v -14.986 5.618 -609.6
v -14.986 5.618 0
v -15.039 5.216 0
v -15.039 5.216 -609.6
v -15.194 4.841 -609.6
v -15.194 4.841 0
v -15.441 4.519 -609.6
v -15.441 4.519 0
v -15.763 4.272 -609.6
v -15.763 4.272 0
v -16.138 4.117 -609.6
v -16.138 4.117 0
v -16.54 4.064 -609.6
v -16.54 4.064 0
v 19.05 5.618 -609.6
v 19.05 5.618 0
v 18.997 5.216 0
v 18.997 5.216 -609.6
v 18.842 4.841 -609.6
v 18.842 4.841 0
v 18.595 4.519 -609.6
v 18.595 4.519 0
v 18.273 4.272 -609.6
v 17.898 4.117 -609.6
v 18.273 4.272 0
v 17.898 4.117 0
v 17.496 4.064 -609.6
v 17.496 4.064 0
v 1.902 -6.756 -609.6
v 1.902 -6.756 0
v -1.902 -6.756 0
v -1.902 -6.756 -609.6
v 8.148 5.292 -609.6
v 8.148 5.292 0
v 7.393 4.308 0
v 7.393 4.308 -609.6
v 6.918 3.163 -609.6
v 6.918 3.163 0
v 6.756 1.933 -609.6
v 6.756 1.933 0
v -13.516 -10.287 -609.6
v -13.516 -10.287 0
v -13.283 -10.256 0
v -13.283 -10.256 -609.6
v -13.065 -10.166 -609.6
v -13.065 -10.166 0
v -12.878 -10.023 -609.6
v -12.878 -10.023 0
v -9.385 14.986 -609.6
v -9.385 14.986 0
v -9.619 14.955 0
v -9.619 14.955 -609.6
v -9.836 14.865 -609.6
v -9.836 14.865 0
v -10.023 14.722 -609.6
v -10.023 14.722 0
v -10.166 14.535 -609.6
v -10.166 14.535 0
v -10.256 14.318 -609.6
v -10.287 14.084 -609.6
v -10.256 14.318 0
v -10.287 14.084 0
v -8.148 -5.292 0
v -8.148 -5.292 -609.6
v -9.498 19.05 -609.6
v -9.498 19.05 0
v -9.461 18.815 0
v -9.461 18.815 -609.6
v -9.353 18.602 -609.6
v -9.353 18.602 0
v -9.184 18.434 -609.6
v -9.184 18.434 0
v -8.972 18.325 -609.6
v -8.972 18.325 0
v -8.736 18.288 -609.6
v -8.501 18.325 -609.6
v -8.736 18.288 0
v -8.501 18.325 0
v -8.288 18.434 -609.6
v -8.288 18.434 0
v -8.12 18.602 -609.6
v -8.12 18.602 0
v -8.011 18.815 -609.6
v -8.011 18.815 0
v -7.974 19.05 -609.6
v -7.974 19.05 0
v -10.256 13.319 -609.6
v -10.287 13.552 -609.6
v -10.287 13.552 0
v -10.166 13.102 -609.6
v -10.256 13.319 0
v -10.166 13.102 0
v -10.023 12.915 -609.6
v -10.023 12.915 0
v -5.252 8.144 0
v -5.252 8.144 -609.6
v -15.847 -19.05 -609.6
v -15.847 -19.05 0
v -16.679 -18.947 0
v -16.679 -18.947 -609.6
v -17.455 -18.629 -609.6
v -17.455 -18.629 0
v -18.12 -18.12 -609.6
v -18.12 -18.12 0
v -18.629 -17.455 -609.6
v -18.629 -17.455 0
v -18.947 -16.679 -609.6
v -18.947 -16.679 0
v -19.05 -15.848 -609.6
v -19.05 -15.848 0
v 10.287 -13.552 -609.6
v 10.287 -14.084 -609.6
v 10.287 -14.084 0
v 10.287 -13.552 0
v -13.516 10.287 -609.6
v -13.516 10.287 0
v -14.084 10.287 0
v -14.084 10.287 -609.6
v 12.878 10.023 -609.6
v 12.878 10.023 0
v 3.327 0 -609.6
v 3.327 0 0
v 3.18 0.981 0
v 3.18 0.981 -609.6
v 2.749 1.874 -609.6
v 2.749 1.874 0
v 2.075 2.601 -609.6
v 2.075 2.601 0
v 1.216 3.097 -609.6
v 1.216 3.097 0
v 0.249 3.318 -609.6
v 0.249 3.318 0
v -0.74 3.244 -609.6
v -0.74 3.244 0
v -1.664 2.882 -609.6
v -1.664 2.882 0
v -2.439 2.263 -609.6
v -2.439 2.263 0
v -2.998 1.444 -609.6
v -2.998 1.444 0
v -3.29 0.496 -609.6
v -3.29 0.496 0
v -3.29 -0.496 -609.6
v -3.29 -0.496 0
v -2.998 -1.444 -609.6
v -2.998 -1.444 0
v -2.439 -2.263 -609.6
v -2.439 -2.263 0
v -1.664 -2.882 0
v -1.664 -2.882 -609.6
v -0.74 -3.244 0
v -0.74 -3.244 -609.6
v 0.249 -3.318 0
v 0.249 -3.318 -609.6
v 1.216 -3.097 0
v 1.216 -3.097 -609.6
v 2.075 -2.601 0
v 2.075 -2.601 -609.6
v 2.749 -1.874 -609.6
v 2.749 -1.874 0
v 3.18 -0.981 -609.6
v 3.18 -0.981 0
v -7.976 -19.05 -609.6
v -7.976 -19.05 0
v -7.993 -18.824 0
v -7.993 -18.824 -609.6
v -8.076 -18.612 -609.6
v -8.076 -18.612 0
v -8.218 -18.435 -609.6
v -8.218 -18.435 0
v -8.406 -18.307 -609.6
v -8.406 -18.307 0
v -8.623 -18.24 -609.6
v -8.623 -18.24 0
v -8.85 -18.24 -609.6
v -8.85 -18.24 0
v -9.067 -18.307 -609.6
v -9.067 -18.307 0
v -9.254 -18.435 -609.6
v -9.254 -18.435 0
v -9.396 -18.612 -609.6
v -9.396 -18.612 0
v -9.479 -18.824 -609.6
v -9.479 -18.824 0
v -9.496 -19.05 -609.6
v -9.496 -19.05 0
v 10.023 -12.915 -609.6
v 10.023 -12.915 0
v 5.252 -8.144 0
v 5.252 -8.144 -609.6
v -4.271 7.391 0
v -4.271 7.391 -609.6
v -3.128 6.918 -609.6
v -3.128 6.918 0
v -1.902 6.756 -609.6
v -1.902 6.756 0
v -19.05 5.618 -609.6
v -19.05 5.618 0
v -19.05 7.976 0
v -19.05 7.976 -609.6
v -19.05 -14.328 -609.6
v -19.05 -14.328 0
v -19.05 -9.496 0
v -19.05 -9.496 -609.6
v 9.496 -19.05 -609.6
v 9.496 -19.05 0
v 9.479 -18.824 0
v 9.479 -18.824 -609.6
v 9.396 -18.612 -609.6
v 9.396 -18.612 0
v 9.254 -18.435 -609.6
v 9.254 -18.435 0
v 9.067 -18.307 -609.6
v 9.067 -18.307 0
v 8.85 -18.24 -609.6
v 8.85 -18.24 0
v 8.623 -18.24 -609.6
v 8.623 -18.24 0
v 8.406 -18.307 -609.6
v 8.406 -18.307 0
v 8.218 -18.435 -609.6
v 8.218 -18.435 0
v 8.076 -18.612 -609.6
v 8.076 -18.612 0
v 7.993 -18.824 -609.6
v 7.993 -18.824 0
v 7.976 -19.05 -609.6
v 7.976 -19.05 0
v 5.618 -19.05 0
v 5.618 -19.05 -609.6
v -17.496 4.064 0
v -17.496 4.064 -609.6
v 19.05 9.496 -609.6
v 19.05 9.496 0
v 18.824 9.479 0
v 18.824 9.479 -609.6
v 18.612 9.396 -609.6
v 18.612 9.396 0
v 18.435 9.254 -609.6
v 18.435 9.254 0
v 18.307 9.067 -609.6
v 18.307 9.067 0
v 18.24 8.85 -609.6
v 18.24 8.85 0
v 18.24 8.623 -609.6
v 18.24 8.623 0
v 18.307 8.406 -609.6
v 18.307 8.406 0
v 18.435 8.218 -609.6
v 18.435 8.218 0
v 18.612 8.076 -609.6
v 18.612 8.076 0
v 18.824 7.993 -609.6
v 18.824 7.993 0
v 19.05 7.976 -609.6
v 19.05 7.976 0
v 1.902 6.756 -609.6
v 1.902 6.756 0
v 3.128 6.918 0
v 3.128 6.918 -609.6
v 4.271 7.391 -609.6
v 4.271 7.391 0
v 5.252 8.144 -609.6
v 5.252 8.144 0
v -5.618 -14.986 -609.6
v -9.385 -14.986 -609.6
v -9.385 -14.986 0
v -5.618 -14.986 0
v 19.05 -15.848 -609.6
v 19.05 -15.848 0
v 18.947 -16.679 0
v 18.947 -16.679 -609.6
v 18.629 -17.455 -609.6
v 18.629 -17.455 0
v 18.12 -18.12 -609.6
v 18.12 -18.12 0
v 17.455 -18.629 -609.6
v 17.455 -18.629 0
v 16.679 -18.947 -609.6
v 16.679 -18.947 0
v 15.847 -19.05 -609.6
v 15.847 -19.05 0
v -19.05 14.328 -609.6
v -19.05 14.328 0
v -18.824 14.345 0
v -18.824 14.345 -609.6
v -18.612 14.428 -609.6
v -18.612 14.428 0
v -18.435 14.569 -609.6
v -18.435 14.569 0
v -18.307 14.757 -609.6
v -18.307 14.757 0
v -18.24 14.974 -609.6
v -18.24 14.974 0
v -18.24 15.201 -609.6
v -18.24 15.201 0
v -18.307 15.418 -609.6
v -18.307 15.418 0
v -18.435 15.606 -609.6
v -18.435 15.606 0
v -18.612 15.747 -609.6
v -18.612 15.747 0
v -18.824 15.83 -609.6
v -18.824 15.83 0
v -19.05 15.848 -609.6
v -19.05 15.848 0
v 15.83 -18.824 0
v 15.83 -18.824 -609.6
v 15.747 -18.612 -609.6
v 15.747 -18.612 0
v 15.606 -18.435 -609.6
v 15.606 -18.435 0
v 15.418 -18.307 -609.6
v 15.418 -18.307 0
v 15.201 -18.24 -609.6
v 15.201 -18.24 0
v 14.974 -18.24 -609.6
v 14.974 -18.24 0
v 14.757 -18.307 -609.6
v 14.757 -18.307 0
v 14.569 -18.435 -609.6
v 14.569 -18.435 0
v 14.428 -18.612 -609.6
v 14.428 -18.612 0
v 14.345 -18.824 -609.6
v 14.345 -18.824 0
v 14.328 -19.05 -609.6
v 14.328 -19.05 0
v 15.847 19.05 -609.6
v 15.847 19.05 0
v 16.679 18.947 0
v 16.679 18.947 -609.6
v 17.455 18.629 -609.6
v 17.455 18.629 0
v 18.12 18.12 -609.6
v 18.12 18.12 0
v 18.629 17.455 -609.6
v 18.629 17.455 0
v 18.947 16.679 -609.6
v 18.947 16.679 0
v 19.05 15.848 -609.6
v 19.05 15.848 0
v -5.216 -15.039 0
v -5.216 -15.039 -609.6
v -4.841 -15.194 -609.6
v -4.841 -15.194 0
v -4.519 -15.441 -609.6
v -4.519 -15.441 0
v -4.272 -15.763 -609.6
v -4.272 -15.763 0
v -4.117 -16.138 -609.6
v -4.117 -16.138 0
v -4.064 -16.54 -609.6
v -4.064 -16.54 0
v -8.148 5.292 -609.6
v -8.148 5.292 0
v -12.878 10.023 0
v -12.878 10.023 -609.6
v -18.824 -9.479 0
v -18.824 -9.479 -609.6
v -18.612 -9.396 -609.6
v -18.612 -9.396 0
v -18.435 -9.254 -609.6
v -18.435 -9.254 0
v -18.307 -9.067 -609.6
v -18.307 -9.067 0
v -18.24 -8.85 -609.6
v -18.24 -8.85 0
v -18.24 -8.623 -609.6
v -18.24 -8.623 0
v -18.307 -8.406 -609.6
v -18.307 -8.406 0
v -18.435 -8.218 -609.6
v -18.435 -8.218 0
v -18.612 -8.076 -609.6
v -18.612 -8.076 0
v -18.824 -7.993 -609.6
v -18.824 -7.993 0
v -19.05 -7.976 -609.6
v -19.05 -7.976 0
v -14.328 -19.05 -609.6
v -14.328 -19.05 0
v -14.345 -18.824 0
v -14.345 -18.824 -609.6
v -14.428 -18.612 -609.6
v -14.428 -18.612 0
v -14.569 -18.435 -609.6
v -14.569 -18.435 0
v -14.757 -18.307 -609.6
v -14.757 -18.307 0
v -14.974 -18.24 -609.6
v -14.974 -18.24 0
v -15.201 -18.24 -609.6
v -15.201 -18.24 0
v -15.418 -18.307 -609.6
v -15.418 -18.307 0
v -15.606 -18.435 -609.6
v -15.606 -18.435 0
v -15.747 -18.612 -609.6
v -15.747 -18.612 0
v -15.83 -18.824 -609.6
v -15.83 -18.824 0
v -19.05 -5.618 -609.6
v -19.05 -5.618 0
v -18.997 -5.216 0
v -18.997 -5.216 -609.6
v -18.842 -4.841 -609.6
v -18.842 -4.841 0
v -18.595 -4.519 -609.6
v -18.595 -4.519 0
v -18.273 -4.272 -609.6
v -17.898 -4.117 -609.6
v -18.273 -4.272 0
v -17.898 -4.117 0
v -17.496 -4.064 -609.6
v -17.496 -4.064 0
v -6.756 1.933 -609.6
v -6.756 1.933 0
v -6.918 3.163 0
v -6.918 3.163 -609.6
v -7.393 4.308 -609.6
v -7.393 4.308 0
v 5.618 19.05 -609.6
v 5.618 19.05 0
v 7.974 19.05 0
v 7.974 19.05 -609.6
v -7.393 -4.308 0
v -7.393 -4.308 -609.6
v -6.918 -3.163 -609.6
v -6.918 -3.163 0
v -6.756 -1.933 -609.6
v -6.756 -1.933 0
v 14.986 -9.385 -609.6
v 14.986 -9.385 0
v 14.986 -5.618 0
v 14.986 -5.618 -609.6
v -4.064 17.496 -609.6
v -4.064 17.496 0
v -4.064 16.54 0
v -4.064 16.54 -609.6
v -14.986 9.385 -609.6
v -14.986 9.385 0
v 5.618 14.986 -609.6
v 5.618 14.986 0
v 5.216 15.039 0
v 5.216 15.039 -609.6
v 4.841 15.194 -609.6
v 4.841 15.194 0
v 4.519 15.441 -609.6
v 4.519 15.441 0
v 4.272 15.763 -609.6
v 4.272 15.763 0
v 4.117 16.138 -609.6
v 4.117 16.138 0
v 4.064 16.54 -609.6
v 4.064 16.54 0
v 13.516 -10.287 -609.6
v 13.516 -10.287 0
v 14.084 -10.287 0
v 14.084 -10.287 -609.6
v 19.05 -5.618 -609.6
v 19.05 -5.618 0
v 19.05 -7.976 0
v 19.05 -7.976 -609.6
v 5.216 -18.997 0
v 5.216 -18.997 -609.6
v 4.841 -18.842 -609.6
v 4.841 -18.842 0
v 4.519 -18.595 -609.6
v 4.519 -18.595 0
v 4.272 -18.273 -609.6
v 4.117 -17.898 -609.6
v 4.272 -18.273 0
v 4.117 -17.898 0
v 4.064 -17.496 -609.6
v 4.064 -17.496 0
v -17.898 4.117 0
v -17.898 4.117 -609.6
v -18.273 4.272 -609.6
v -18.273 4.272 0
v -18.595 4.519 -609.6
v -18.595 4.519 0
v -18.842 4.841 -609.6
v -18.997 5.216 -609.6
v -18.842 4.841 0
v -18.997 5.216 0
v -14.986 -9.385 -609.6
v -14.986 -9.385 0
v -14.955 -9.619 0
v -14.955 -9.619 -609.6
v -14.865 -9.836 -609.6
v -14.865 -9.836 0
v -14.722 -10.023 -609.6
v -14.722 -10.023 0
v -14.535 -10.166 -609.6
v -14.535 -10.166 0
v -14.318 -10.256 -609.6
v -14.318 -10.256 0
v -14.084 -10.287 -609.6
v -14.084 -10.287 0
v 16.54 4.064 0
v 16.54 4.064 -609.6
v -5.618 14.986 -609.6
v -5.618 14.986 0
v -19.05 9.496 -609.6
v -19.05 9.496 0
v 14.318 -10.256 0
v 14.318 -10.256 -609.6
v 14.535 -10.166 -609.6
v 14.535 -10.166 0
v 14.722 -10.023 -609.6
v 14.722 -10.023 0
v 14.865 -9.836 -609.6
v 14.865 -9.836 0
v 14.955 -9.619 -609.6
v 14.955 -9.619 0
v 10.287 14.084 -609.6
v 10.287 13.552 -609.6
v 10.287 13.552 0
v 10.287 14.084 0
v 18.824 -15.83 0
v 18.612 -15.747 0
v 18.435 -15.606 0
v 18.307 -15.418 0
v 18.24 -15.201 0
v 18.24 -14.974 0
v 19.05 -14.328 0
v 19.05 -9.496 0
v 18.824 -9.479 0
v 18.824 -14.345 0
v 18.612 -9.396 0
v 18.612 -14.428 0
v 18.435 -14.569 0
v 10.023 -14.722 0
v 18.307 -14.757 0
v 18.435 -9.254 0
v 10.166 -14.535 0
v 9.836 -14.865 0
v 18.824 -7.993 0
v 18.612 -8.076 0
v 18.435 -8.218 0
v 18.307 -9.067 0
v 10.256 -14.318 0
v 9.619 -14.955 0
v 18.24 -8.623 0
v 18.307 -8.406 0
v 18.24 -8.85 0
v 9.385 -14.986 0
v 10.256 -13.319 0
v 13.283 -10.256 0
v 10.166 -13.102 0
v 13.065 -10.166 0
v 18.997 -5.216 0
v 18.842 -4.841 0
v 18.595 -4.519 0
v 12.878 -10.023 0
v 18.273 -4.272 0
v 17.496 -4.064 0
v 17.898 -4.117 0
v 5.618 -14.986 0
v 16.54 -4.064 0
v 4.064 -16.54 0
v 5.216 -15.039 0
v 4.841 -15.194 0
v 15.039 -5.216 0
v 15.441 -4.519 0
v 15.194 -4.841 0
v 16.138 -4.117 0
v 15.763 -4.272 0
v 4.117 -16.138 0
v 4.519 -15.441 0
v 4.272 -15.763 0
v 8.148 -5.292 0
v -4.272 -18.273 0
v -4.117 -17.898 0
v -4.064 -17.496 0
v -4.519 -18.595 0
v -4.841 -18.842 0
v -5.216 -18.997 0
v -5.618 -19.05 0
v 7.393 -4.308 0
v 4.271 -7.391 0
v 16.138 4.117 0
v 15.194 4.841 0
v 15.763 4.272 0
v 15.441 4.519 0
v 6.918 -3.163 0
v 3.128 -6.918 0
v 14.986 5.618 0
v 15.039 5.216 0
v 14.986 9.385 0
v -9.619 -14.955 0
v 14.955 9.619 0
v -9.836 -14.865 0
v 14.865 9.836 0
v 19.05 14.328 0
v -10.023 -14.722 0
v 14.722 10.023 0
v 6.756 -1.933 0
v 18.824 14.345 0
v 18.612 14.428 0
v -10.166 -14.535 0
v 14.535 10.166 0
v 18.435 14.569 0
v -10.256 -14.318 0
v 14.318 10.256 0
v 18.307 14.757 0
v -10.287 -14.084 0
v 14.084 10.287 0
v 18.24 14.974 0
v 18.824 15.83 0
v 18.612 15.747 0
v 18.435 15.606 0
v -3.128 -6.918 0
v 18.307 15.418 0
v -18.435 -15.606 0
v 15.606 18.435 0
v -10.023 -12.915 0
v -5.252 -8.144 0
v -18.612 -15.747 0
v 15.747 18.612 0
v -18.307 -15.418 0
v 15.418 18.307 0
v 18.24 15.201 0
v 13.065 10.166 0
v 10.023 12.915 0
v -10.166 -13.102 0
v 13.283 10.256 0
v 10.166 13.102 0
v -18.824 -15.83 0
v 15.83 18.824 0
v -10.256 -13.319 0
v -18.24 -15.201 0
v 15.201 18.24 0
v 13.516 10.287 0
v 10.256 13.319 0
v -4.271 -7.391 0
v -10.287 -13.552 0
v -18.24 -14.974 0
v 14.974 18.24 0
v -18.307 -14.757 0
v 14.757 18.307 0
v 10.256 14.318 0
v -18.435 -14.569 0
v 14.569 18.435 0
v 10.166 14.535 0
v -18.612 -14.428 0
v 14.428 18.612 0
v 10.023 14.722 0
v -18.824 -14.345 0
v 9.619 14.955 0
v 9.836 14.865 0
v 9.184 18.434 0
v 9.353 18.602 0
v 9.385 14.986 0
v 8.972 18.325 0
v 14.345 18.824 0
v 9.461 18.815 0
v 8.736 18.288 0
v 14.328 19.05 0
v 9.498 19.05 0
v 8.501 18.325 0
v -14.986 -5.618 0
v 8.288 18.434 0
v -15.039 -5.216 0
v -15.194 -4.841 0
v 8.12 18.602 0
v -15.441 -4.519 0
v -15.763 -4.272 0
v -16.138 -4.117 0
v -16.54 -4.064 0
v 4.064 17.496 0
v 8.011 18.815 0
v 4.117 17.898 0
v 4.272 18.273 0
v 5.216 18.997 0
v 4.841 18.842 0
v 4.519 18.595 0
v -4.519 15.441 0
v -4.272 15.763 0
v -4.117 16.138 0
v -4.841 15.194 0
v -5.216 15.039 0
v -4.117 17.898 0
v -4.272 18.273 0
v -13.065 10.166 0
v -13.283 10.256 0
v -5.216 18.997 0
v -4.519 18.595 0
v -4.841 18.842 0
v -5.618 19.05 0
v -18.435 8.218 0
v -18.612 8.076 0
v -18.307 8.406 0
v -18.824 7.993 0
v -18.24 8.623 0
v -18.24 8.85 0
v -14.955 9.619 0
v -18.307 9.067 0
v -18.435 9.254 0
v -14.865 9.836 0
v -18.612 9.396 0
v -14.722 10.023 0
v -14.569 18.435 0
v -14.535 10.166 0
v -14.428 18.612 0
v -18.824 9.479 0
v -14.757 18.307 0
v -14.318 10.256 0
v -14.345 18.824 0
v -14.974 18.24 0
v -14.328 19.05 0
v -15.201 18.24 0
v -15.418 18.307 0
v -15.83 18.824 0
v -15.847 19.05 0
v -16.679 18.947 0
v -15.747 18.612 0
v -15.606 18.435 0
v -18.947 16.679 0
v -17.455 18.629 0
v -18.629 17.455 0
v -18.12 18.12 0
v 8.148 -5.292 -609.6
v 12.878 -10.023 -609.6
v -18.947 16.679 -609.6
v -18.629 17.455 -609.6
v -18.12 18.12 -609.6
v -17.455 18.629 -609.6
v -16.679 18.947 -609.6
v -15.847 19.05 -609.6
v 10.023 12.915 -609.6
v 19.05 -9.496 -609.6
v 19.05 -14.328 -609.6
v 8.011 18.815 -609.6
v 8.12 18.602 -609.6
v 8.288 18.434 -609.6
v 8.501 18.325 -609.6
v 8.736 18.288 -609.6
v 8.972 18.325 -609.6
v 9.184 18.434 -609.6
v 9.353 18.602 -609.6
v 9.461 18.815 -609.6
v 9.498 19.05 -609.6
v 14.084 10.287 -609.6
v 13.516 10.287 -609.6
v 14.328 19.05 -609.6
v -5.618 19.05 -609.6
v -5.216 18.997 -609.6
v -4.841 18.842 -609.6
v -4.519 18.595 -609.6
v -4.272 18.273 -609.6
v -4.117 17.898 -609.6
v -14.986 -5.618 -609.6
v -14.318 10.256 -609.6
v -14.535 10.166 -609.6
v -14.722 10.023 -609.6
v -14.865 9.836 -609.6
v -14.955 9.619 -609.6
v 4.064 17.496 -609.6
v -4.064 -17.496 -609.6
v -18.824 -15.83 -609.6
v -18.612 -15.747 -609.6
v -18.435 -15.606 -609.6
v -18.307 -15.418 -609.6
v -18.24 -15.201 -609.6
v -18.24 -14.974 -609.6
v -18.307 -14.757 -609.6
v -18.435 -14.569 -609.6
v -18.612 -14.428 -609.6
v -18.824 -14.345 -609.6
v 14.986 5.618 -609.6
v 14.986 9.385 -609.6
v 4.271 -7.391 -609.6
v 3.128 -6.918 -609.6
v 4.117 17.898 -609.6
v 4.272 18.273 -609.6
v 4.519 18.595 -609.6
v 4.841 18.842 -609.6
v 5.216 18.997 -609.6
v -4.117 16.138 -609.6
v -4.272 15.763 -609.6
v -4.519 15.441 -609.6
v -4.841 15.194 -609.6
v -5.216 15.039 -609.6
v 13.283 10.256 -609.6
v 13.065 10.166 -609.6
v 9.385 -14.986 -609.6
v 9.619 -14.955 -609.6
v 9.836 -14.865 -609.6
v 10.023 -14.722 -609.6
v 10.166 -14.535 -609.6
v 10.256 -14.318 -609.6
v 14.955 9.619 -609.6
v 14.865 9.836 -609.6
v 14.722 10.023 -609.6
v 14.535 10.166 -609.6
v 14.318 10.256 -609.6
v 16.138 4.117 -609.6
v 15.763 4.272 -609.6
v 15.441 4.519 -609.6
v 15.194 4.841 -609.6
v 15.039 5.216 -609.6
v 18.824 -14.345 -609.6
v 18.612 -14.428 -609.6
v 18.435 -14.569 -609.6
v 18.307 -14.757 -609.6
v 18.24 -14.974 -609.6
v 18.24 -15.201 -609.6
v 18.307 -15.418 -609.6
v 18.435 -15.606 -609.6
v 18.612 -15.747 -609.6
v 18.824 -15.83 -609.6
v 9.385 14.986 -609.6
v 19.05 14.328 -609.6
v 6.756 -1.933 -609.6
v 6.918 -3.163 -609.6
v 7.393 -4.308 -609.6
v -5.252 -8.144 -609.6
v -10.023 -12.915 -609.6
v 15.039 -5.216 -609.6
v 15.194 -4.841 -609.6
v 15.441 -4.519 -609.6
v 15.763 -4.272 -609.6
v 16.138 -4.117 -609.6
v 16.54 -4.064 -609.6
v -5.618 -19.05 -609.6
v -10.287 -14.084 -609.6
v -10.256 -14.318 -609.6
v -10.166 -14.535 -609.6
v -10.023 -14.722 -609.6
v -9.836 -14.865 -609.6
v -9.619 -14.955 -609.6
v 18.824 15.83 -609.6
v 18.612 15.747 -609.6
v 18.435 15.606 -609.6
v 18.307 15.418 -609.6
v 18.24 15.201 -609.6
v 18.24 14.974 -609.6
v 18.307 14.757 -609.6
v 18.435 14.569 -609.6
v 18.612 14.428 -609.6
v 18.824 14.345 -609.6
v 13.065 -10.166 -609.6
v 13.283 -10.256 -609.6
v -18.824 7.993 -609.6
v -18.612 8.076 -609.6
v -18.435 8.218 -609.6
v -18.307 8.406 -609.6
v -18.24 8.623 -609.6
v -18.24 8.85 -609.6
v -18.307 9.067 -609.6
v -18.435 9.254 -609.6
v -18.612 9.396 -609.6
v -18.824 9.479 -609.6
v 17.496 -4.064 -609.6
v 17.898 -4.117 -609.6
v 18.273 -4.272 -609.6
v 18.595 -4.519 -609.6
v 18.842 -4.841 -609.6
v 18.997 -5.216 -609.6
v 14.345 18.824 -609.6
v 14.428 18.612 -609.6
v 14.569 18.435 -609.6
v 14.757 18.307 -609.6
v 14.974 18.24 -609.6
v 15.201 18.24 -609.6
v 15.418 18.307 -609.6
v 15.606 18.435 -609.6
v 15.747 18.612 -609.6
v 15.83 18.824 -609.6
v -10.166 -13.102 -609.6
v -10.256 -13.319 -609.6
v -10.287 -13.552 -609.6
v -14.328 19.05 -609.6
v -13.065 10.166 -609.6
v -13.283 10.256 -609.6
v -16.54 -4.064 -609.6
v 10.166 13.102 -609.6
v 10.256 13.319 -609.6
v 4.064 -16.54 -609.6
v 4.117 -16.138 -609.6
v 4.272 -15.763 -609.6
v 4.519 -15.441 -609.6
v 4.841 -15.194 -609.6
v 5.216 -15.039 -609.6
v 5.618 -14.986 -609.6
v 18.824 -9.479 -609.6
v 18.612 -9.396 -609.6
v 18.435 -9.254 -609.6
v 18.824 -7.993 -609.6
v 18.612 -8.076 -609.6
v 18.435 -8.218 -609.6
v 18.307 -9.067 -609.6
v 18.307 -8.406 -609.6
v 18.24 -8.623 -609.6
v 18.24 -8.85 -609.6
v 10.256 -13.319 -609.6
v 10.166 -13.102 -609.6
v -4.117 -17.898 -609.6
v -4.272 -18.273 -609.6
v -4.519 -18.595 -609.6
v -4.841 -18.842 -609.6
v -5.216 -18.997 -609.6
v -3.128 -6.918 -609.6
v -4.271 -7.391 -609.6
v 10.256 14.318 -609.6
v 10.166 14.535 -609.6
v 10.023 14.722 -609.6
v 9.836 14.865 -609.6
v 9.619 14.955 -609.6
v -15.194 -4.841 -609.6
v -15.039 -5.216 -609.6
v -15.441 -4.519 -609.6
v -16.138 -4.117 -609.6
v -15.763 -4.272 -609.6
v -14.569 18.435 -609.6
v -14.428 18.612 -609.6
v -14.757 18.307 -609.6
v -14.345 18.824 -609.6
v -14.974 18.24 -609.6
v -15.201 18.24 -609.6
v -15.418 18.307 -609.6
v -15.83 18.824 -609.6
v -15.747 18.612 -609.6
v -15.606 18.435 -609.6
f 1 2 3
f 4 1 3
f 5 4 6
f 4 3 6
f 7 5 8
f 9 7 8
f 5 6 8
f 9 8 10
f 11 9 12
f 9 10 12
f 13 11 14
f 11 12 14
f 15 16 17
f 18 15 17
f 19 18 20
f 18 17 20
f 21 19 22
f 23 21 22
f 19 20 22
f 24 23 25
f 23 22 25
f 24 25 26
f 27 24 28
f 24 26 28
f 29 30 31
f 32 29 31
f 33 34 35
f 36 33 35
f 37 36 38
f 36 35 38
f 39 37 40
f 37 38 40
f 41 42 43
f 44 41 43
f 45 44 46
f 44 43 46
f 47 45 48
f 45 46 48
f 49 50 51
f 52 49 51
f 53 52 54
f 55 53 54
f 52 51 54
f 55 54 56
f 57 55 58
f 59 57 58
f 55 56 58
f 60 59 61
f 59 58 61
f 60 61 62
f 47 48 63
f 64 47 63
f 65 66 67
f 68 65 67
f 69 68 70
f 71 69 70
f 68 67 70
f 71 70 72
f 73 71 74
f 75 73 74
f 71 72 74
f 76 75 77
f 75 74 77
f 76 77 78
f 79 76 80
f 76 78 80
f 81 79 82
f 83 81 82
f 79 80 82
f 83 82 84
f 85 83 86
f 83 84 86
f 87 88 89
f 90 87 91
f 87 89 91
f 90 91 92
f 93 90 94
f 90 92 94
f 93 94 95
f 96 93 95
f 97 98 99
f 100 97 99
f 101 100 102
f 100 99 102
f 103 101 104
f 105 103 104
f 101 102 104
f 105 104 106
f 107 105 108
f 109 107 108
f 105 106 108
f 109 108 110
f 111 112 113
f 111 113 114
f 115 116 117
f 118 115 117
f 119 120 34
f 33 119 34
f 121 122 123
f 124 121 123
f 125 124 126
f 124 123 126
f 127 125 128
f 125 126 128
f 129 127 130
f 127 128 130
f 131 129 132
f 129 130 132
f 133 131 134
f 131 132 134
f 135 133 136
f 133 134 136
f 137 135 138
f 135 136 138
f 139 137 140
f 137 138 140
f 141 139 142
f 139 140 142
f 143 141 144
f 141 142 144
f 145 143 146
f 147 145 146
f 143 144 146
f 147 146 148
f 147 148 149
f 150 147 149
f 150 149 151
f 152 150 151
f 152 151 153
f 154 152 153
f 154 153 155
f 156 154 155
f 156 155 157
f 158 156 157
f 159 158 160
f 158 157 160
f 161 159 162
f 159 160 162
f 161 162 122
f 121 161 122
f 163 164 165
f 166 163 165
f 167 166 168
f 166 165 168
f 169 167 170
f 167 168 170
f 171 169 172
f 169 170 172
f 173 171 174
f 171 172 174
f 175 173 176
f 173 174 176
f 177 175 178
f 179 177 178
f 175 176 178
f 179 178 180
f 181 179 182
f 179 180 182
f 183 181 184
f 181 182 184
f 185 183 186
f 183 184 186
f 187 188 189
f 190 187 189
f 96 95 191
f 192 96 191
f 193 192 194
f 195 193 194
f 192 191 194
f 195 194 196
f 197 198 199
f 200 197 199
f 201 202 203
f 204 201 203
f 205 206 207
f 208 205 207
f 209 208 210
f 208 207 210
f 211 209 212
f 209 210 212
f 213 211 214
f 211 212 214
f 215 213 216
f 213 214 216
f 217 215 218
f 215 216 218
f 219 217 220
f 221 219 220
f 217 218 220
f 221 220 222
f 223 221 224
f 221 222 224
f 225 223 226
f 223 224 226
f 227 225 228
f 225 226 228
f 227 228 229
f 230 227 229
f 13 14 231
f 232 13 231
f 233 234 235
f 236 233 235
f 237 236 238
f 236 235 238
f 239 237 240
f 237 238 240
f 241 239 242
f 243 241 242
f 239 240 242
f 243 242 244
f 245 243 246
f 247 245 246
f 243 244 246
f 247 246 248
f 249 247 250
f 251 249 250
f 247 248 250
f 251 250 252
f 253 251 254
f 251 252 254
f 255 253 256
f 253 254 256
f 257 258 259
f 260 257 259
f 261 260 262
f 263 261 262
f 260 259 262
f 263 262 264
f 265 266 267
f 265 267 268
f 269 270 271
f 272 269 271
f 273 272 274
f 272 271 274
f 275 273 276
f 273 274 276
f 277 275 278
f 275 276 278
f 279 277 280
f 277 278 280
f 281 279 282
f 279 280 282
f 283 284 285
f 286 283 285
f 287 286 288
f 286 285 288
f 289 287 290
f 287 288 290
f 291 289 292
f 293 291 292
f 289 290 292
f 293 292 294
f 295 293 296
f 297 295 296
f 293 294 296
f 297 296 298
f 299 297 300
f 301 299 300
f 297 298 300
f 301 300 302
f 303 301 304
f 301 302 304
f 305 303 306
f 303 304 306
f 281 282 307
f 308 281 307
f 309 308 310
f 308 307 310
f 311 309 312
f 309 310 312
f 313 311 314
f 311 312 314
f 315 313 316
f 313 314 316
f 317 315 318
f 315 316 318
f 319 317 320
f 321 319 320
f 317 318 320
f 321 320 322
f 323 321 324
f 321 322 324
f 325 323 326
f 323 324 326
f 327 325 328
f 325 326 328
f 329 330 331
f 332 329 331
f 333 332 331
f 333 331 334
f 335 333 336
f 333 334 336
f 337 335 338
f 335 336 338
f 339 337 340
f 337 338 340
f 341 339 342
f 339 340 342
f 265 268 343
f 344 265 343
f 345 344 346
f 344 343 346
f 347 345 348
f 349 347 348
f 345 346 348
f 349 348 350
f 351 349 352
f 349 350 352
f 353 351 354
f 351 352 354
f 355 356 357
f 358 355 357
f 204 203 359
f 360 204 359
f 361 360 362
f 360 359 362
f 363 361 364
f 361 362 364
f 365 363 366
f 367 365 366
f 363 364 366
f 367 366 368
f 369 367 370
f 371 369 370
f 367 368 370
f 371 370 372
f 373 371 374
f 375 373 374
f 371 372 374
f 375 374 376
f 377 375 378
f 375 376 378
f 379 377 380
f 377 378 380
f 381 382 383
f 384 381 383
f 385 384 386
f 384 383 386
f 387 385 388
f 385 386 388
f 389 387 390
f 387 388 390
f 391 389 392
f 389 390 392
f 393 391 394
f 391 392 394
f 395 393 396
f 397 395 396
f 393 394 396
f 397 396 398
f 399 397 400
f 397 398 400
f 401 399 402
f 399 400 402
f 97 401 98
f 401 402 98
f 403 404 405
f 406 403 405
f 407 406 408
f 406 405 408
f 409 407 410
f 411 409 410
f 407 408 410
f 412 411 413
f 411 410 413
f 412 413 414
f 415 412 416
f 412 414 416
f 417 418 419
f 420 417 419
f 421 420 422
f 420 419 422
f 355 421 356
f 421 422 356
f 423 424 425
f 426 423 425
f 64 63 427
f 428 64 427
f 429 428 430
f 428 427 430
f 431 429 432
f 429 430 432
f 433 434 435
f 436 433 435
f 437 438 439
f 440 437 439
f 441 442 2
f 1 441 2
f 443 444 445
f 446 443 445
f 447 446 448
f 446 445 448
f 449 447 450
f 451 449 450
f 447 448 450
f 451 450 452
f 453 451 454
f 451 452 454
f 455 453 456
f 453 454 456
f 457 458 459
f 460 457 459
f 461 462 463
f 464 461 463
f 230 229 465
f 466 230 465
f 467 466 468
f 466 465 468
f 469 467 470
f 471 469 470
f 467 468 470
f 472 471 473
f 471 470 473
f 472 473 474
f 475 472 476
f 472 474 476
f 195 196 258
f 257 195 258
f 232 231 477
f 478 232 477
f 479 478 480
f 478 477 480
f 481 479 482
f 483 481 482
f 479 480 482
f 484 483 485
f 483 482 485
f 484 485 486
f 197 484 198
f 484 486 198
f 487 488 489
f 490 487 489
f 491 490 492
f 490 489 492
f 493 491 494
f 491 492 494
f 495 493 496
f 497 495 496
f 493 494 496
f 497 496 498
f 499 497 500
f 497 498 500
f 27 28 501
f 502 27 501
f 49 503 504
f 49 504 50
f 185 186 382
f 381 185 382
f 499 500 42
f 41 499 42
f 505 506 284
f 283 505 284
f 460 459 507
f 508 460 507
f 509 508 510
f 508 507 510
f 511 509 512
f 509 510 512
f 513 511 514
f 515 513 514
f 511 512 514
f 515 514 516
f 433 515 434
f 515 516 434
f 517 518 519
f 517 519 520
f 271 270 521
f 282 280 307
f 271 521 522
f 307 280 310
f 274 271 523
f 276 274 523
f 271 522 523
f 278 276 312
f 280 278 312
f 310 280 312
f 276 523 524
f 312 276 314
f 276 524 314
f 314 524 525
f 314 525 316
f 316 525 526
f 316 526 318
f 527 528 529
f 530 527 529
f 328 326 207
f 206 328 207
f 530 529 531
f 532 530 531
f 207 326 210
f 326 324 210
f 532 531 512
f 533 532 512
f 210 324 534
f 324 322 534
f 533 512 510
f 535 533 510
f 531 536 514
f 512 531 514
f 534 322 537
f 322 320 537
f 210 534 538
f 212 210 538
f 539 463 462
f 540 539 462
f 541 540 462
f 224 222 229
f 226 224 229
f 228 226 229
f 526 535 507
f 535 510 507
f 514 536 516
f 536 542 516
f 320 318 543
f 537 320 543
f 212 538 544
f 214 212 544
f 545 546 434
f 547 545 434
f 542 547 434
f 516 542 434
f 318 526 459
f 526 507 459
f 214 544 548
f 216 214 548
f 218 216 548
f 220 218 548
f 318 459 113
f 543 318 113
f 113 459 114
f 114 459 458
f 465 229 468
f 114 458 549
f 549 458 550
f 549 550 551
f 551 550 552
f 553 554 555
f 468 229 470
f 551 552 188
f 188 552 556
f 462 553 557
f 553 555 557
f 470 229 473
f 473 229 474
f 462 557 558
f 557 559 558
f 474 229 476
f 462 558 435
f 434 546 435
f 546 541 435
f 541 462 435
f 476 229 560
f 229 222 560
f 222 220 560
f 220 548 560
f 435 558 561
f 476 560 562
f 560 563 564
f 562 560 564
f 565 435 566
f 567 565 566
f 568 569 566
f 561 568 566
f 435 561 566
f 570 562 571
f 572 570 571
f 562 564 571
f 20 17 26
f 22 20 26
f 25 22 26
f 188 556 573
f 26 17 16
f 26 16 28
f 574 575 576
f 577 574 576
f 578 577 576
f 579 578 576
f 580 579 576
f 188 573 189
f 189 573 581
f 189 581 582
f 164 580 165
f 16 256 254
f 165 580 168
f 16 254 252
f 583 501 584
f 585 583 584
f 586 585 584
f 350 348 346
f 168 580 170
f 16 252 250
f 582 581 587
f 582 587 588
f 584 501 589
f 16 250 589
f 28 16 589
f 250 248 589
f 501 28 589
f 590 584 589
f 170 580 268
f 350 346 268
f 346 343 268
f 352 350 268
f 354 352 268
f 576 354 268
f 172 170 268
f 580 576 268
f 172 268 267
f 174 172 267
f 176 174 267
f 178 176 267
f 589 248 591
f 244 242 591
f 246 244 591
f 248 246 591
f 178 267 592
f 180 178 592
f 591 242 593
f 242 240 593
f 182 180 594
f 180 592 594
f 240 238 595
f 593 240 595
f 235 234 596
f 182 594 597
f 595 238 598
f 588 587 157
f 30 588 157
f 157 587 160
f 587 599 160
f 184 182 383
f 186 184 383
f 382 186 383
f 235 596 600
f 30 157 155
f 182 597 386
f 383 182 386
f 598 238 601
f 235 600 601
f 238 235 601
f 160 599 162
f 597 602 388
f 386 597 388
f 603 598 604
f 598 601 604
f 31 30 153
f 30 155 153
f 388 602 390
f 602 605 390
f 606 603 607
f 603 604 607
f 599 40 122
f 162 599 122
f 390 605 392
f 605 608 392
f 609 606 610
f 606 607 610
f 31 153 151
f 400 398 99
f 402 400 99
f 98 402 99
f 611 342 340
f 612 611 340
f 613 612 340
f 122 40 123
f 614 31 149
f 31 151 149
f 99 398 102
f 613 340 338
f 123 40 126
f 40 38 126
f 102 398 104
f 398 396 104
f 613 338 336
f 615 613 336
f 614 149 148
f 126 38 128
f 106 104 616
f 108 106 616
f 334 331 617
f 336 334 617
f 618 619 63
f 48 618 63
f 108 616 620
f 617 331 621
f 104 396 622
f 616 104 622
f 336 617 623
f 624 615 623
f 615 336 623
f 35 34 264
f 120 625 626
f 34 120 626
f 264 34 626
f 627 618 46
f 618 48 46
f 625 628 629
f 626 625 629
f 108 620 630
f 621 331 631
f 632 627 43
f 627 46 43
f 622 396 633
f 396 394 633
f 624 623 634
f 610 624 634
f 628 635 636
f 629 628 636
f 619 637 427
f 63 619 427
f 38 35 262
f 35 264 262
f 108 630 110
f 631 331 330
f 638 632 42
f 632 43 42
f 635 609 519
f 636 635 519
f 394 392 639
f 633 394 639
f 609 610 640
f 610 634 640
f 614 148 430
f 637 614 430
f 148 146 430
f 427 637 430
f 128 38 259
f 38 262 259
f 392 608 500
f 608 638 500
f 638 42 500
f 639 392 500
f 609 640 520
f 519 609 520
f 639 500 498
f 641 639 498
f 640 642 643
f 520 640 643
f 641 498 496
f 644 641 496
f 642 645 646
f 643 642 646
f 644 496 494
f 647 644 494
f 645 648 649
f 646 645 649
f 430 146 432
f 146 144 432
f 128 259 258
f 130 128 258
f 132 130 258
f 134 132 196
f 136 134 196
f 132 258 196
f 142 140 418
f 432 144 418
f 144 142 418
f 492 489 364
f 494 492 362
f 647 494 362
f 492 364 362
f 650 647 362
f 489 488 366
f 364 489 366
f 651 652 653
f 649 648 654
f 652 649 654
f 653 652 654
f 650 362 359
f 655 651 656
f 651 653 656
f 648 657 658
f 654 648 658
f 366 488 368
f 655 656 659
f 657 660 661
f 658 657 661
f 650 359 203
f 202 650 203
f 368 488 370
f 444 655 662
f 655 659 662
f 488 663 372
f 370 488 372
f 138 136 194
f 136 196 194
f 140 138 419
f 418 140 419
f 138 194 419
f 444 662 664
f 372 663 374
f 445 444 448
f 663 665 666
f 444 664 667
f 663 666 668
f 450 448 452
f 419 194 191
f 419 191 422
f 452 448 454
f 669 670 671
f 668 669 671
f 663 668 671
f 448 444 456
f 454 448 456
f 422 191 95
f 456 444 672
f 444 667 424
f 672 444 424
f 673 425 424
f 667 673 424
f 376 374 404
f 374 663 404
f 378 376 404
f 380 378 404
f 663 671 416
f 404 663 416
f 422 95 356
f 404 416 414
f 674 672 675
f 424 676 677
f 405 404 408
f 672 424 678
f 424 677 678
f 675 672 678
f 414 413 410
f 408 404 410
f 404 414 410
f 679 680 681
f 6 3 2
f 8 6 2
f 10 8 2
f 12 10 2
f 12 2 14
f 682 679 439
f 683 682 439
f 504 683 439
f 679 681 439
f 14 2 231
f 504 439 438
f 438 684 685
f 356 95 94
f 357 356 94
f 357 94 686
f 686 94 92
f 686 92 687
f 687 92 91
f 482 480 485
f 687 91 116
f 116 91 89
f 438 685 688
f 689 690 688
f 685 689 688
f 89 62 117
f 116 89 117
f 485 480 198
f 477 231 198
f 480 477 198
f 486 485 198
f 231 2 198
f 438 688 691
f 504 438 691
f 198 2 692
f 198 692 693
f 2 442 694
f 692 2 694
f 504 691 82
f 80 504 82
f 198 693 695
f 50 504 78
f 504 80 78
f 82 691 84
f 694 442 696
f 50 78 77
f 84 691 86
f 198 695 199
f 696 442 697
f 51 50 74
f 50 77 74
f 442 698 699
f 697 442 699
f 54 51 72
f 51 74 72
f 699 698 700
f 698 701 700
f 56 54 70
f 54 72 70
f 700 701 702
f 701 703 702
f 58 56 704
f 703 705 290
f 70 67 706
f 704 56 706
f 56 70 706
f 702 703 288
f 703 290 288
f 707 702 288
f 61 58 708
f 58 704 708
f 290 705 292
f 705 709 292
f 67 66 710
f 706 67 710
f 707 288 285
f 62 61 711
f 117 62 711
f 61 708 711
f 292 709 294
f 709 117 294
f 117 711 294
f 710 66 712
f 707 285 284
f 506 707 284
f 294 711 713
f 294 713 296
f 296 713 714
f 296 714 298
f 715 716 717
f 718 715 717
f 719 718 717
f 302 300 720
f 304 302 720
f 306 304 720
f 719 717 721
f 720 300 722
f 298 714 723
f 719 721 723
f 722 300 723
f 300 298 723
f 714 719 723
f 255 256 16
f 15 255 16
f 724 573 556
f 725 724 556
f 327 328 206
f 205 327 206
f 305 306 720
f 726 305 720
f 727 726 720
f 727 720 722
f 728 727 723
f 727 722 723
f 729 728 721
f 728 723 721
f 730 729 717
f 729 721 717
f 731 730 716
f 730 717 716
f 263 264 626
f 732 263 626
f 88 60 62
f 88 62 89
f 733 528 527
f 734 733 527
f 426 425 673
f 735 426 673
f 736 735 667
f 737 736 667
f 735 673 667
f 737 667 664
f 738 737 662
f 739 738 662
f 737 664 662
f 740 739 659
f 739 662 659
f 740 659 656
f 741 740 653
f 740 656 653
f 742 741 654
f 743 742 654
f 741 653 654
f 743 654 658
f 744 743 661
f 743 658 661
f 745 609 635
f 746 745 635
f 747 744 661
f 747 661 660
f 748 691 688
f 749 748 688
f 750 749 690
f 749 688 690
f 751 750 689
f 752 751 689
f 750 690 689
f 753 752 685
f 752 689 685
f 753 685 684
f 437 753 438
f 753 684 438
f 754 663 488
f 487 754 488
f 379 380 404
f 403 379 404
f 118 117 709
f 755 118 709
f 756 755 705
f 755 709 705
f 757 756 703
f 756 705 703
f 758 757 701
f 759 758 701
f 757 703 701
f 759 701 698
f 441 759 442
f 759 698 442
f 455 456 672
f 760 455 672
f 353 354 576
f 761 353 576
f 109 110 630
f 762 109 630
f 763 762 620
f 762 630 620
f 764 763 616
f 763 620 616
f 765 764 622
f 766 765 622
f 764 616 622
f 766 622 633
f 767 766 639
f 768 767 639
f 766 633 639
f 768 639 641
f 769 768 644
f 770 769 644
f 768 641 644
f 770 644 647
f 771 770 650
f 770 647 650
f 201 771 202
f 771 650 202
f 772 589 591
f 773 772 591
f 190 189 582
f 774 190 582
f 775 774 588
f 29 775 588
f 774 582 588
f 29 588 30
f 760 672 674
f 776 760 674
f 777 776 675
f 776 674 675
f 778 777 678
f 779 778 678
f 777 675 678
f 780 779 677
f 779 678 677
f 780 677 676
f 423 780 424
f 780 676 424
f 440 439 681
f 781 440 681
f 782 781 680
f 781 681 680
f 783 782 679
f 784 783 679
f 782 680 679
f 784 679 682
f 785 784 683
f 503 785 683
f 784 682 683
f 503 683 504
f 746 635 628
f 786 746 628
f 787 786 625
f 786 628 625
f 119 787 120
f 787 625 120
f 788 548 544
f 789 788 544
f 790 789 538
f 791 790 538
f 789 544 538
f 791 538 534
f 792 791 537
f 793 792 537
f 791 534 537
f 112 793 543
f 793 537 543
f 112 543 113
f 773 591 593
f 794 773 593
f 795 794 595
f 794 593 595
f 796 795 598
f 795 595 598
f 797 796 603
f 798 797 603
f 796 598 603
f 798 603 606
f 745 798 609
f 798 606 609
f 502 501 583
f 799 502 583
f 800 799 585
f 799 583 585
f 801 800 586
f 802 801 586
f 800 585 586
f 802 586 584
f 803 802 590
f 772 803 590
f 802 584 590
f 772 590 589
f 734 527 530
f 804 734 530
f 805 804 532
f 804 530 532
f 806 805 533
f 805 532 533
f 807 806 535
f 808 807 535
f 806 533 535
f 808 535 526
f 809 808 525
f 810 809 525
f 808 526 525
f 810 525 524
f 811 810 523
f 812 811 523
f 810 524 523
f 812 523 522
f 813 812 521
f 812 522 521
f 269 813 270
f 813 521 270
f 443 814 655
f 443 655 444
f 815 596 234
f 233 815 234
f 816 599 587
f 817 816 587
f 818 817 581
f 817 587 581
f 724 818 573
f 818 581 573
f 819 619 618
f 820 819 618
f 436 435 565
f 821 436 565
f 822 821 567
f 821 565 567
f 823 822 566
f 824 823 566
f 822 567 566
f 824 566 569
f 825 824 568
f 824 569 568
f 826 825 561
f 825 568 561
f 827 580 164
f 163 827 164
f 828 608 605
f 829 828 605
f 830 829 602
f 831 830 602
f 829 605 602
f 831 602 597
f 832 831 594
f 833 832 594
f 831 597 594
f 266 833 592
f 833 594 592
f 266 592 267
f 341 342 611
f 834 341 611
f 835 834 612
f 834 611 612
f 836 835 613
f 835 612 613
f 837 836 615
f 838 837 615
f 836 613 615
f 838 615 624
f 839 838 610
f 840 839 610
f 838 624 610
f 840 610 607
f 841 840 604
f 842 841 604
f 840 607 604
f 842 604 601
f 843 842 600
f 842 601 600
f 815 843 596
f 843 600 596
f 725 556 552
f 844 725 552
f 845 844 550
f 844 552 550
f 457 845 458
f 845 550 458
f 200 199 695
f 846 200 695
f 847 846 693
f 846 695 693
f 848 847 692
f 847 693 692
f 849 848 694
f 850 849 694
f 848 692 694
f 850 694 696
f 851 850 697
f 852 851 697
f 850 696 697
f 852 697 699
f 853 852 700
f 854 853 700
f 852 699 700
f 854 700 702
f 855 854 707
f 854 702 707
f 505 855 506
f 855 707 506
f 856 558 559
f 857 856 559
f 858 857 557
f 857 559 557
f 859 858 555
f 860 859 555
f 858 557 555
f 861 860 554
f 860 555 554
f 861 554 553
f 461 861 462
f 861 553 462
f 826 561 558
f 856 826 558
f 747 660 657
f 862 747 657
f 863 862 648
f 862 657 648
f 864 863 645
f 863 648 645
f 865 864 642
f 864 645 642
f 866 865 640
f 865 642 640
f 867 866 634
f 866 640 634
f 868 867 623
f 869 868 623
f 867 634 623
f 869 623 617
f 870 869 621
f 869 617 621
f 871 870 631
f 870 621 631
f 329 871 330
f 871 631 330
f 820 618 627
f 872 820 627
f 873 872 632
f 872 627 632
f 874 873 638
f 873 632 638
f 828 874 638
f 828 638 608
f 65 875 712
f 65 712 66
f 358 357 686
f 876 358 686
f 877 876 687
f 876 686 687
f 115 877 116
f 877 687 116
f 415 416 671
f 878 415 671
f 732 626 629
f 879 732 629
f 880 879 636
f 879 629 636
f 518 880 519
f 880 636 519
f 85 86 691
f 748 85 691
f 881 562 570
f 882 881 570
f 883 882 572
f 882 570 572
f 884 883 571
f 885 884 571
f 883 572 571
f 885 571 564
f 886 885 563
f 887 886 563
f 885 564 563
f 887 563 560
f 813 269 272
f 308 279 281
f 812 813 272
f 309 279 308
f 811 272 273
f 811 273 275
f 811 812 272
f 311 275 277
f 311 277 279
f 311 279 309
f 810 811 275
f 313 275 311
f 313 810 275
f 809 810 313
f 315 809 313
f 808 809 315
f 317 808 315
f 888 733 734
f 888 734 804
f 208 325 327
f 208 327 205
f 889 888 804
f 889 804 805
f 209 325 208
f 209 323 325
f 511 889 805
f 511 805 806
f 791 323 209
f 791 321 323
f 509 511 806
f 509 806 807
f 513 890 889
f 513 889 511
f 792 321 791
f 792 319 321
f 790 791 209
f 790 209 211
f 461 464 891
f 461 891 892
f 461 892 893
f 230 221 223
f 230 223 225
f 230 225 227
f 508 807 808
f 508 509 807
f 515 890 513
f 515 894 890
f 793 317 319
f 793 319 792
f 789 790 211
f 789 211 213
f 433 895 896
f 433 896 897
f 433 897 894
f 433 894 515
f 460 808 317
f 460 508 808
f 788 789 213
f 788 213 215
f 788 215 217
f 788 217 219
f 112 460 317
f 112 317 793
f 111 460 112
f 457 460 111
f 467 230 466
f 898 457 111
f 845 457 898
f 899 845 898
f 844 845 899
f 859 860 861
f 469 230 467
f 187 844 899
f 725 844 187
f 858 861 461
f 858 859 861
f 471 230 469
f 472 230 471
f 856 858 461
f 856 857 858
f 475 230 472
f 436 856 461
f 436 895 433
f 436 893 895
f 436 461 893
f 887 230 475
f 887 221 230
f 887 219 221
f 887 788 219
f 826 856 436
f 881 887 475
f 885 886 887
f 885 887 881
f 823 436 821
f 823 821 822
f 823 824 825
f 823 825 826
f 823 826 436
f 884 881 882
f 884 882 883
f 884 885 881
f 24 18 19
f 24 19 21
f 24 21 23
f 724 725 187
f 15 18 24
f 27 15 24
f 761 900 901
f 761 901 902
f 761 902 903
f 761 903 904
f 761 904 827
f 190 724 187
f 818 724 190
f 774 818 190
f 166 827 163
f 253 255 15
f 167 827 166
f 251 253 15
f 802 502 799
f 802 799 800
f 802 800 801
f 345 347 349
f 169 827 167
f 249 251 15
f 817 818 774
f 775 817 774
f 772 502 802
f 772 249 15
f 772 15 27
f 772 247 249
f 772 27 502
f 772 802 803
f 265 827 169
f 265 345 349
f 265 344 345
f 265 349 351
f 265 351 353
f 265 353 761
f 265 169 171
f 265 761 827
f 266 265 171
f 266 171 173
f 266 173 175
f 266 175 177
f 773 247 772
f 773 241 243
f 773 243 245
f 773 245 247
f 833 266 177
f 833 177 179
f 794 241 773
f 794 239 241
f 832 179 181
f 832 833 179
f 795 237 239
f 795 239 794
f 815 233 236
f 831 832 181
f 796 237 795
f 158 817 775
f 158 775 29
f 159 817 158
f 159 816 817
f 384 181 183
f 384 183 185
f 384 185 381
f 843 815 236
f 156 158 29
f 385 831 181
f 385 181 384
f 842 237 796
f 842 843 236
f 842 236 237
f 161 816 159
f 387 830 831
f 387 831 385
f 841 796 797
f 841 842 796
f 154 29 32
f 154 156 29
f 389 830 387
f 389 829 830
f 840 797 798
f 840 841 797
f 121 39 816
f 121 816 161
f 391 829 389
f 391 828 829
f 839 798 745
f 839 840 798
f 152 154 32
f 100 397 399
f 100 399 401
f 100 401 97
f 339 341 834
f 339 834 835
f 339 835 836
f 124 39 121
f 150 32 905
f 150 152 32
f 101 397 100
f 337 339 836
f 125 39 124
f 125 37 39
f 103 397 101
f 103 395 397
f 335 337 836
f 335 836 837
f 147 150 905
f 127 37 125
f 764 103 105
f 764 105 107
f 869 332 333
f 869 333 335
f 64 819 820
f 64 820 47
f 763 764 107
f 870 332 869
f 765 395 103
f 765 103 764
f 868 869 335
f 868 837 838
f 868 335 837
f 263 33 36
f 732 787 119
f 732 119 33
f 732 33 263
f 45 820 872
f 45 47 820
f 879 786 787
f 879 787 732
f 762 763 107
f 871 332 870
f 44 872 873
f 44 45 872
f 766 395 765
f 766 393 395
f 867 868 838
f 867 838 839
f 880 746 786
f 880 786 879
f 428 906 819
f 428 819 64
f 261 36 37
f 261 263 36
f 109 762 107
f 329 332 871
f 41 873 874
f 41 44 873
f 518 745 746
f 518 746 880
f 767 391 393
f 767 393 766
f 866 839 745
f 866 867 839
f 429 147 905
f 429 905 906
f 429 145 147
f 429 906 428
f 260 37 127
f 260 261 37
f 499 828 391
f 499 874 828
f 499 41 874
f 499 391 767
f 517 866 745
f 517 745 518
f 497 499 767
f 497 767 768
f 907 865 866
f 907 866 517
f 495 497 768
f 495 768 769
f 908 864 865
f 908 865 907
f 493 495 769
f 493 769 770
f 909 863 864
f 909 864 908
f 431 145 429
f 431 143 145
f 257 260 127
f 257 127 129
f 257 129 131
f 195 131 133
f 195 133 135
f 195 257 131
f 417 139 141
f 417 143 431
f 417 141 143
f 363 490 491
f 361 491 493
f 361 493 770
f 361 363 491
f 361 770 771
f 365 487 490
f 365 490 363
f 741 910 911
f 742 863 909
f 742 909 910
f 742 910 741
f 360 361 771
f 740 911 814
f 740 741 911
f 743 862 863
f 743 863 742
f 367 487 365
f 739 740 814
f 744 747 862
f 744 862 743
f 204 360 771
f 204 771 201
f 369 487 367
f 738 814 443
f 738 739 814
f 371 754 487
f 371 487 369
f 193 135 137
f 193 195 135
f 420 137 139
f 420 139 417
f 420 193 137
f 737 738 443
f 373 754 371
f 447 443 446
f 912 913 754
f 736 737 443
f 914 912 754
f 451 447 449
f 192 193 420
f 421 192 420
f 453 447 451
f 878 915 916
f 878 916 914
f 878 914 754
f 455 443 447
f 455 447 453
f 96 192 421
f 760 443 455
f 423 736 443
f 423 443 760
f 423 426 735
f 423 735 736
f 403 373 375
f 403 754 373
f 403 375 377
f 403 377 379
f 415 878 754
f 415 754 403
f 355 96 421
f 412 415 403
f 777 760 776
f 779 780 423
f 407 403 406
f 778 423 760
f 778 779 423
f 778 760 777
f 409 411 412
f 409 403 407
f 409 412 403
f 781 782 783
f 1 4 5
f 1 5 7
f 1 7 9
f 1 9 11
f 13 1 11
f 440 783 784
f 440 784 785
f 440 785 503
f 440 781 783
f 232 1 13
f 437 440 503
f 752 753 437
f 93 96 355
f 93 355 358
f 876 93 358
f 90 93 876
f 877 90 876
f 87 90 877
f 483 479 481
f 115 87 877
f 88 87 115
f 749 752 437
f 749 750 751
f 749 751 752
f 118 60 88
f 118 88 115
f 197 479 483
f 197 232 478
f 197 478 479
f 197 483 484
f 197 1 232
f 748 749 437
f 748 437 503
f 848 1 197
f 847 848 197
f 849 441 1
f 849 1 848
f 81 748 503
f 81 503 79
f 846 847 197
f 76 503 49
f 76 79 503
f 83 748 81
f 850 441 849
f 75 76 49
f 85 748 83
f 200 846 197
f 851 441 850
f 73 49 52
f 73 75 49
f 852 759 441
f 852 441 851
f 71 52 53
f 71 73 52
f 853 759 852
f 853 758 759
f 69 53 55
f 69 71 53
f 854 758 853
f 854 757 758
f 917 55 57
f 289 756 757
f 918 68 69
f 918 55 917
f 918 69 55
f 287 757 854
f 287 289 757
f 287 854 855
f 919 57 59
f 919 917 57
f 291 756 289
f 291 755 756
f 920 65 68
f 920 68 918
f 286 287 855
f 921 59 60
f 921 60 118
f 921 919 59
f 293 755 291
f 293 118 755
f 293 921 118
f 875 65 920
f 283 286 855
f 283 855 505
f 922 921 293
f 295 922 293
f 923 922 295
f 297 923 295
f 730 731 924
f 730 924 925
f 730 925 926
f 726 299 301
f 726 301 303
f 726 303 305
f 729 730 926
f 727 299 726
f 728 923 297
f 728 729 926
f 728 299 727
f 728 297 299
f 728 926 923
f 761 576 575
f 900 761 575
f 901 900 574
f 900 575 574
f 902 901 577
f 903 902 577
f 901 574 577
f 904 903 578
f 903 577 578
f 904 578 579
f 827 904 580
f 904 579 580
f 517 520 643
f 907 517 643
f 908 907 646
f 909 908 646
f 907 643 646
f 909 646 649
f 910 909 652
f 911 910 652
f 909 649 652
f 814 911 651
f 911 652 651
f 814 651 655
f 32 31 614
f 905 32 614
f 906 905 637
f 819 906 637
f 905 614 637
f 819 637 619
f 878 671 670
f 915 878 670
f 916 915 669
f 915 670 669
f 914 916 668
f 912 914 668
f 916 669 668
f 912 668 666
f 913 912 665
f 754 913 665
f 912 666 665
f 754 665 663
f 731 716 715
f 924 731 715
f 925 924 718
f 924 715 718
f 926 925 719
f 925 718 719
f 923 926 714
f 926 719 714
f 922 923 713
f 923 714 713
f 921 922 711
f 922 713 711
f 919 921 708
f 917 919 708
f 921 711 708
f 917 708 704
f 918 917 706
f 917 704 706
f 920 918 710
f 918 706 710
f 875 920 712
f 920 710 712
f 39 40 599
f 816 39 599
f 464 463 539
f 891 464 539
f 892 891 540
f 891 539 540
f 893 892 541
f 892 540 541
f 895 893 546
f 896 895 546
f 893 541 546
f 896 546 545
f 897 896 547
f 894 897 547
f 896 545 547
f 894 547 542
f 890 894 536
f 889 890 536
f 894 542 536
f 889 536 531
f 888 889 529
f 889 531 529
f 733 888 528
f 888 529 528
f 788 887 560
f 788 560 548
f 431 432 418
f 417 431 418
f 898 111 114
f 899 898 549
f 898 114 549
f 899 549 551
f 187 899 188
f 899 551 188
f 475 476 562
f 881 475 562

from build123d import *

# Parameters (mm, degrees)
SKETCH1_R      = 3.3274
EXTRUDE1_DEPTH = 609.6


with BuildPart() as part:
    # Sketch1 → Extrude1 (new body)
    with BuildSketch(Plane.XY):
        with BuildLine():
            Line((-10.022898969, 12.91475973), (-5.252158105, 8.144007132))
            ThreePointArc((-5.252158105, 8.144007132), (-3.715177372, 7.117027388), (-1.902183975, 6.7564))
            Line((-1.902183975, 6.7564), (1.902183975, 6.7564))
            ThreePointArc((1.902183975, 6.7564), (3.715177372, 7.117027388), (5.252158105, 8.144007132))
            Line((5.252158105, 8.144007132), (10.022898969, 12.91475973))
            ThreePointArc((10.022898969, 12.91475973), (10.218362387, 13.207291992), (10.287, 13.552357131))
            Line((10.287, 13.552357131), (10.287, 14.0843))
            ThreePointArc((10.287, 14.0843), (10.022898185, 14.721898185), (9.3853, 14.986))
            Line((9.3853, 14.986), (5.617617549, 14.986))
            ThreePointArc((5.617617549, 14.986), (4.519044045, 15.441044045), (4.064, 16.539617549))
            Line((4.064, 16.539617549), (4.064, 17.496382451))
            ThreePointArc((4.064, 17.496382451), (4.519044045, 18.594955955), (5.617617549, 19.05))
            Line((5.617617549, 19.05), (7.974178704, 19.05))
            ThreePointArc((7.974178704, 19.05), (8.736178704, 18.288), (9.498178704, 19.05))
            Line((9.498178704, 19.05), (14.327719207, 19.05))
            ThreePointArc((14.327719207, 19.05), (15.087603123, 18.231251131), (15.847487039, 19.05))
            ThreePointArc((15.847487039, 19.05), (18.120176289, 18.120192083), (19.05, 15.847509295))
            ThreePointArc((19.05, 15.847509295), (18.231250992, 15.08762539), (19.05, 14.327741484))
            Line((19.05, 14.327741484), (19.05, 9.496091471))
            ThreePointArc((19.05, 9.496091471), (18.231250992, 8.736207565), (19.05, 7.97632366))
            Line((19.05, 7.97632366), (19.05, 5.617617549))
            ThreePointArc((19.05, 5.617617549), (18.594955955, 4.519044045), (17.496382451, 4.064))
            Line((17.496382451, 4.064), (16.539617549, 4.064))
            ThreePointArc((16.539617549, 4.064), (15.441044045, 4.519044045), (14.986, 5.617617549))
            Line((14.986, 5.617617549), (14.986, 9.385342516))
            ThreePointArc((14.986, 9.385342516), (14.721898185, 10.022940701), (14.0843, 10.287042516))
            Line((14.0843, 10.287042516), (13.516042086, 10.287042516))
            ThreePointArc((13.516042086, 10.287042516), (13.170975923, 10.218404478), (12.878443117, 10.022939917))
            Line((12.878443117, 10.022939917), (8.14758008, 5.292065243))
            ThreePointArc((8.14758008, 5.292065243), (7.117955879, 3.751120653), (6.7564, 1.933453584))
            Line((6.7564, 1.933453584), (6.7564, -1.933453584))
            ThreePointArc((6.7564, -1.933453584), (7.117955879, -3.751120653), (8.14758008, -5.292065243))
            Line((8.14758008, -5.292065243), (12.878443117, -10.022939917))
            ThreePointArc((12.878443117, -10.022939917), (13.170975923, -10.218404478), (13.516042086, -10.287042516))
            Line((13.516042086, -10.287042516), (14.0843, -10.287042516))
            ThreePointArc((14.0843, -10.287042516), (14.721898185, -10.022940701), (14.986, -9.385342516))
            Line((14.986, -9.385342516), (14.986, -5.617617549))
            ThreePointArc((14.986, -5.617617549), (15.441044045, -4.519044045), (16.539617549, -4.064))
            Line((16.539617549, -4.064), (17.496382451, -4.064))
            ThreePointArc((17.496382451, -4.064), (18.594955955, -4.519044045), (19.05, -5.617617549))
            Line((19.05, -5.617617549), (19.05, -7.976318491))
            ThreePointArc((19.05, -7.976318491), (18.231250992, -8.736202396), (19.05, -9.496086302))
            Line((19.05, -9.496086302), (19.05, -14.32774291))
            ThreePointArc((19.05, -14.32774291), (18.231250992, -15.087626816), (19.05, -15.847510721))
            ThreePointArc((19.05, -15.847510721), (18.120175716, -18.120192644), (15.847486868, -19.05))
            ThreePointArc((15.847486868, -19.05), (15.087602952, -18.231251131), (14.327719036, -19.05))
            Line((14.327719036, -19.05), (9.496062448, -19.05))
            ThreePointArc((9.496062448, -19.05), (8.736178532, -18.231251131), (7.976294616, -19.05))
            Line((7.976294616, -19.05), (5.617617549, -19.05))
            ThreePointArc((5.617617549, -19.05), (4.519044045, -18.594955955), (4.064, -17.496382451))
            Line((4.064, -17.496382451), (4.064, -16.539617549))
            ThreePointArc((4.064, -16.539617549), (4.519044045, -15.441044045), (5.617617549, -14.986))
            Line((5.617617549, -14.986), (9.3853, -14.986))
            ThreePointArc((9.3853, -14.986), (10.022898185, -14.721898185), (10.287, -14.0843))
            Line((10.287, -14.0843), (10.287, -13.552357131))
            ThreePointArc((10.287, -13.552357131), (10.218362387, -13.207291992), (10.022898969, -12.91475973))
            Line((10.022898969, -12.91475973), (5.252158105, -8.144007132))
            ThreePointArc((5.252158105, -8.144007132), (3.715177372, -7.117027388), (1.902183975, -6.7564))
            Line((1.902183975, -6.7564), (-1.902183975, -6.7564))
            ThreePointArc((-1.902183975, -6.7564), (-3.715177372, -7.117027388), (-5.252158105, -8.144007132))
            Line((-5.252158105, -8.144007132), (-10.022898969, -12.91475973))
            ThreePointArc((-10.022898969, -12.91475973), (-10.218362387, -13.207291992), (-10.287, -13.552357131))
            Line((-10.287, -13.552357131), (-10.287, -14.0843))
            ThreePointArc((-10.287, -14.0843), (-10.022898185, -14.721898185), (-9.3853, -14.986))
            Line((-9.3853, -14.986), (-5.617617549, -14.986))
            ThreePointArc((-5.617617549, -14.986), (-4.519044045, -15.441044045), (-4.064, -16.539617549))
            Line((-4.064, -16.539617549), (-4.064, -17.496382451))
            ThreePointArc((-4.064, -17.496382451), (-4.519044045, -18.594955955), (-5.617617549, -19.05))
            Line((-5.617617549, -19.05), (-7.976294616, -19.05))
            ThreePointArc((-7.976294616, -19.05), (-8.736178532, -18.231251131), (-9.496062448, -19.05))
            Line((-9.496062448, -19.05), (-14.327719036, -19.05))
            ThreePointArc((-14.327719036, -19.05), (-15.087602952, -18.231251131), (-15.847486868, -19.05))
            ThreePointArc((-15.847486868, -19.05), (-18.120175716, -18.120192644), (-19.05, -15.847510721))
            ThreePointArc((-19.05, -15.847510721), (-18.231250992, -15.087626816), (-19.05, -14.32774291))
            Line((-19.05, -14.32774291), (-19.05, -9.496086302))
            ThreePointArc((-19.05, -9.496086302), (-18.231250992, -8.736202396), (-19.05, -7.976318491))
            Line((-19.05, -7.976318491), (-19.05, -5.617617549))
            ThreePointArc((-19.05, -5.617617549), (-18.594955955, -4.519044045), (-17.496382451, -4.064))
            Line((-17.496382451, -4.064), (-16.539617549, -4.064))
            ThreePointArc((-16.539617549, -4.064), (-15.441044045, -4.519044045), (-14.986, -5.617617549))
            Line((-14.986, -5.617617549), (-14.986, -9.385342516))
            ThreePointArc((-14.986, -9.385342516), (-14.721898185, -10.022940701), (-14.0843, -10.287042516))
            Line((-14.0843, -10.287042516), (-13.516042086, -10.287042516))
            ThreePointArc((-13.516042086, -10.287042516), (-13.170975923, -10.218404478), (-12.878443117, -10.022939917))
            Line((-12.878443117, -10.022939917), (-8.14758008, -5.292065243))
            ThreePointArc((-8.14758008, -5.292065243), (-7.117955879, -3.751120653), (-6.7564, -1.933453584))
            Line((-6.7564, -1.933453584), (-6.7564, 1.933453584))
            ThreePointArc((-6.7564, 1.933453584), (-7.117955879, 3.751120653), (-8.14758008, 5.292065243))
            Line((-8.14758008, 5.292065243), (-12.878443117, 10.022939917))
            ThreePointArc((-12.878443117, 10.022939917), (-13.170975923, 10.218404478), (-13.516042086, 10.287042516))
            Line((-13.516042086, 10.287042516), (-14.0843, 10.287042516))
            ThreePointArc((-14.0843, 10.287042516), (-14.721898185, 10.022940701), (-14.986, 9.385342516))
            Line((-14.986, 9.385342516), (-14.986, 5.617617549))
            ThreePointArc((-14.986, 5.617617549), (-15.441044045, 4.519044045), (-16.539617549, 4.064))
            Line((-16.539617549, 4.064), (-17.496382451, 4.064))
            ThreePointArc((-17.496382451, 4.064), (-18.594955955, 4.519044045), (-19.05, 5.617617549))
            Line((-19.05, 5.617617549), (-19.05, 7.97632366))
            ThreePointArc((-19.05, 7.97632366), (-18.231250992, 8.736207565), (-19.05, 9.496091471))
            Line((-19.05, 9.496091471), (-19.05, 14.327741484))
            ThreePointArc((-19.05, 14.327741484), (-18.231250992, 15.08762539), (-19.05, 15.847509295))
            ThreePointArc((-19.05, 15.847509295), (-18.120176289, 18.120192083), (-15.847487039, 19.05))
            ThreePointArc((-15.847487039, 19.05), (-15.087603123, 18.231251131), (-14.327719207, 19.05))
            Line((-14.327719207, 19.05), (-9.498178704, 19.05))
            ThreePointArc((-9.498178704, 19.05), (-8.736178704, 18.288), (-7.974178704, 19.05))
            Line((-7.974178704, 19.05), (-5.617617549, 19.05))
            ThreePointArc((-5.617617549, 19.05), (-4.519044045, 18.594955955), (-4.064, 17.496382451))
            Line((-4.064, 17.496382451), (-4.064, 16.539617549))
            ThreePointArc((-4.064, 16.539617549), (-4.519044045, 15.441044045), (-5.617617549, 14.986))
            Line((-5.617617549, 14.986), (-9.3853, 14.986))
            ThreePointArc((-9.3853, 14.986), (-10.022898185, 14.721898185), (-10.287, 14.0843))
            Line((-10.287, 14.0843), (-10.287, 13.552357131))
            ThreePointArc((-10.287, 13.552357131), (-10.218362387, 13.207291992), (-10.022898969, 12.91475973))
        make_face()
        Circle(SKETCH1_R, mode=Mode.SUBTRACT)
    extrude(amount=-EXTRUDE1_DEPTH)


solid = part.part
